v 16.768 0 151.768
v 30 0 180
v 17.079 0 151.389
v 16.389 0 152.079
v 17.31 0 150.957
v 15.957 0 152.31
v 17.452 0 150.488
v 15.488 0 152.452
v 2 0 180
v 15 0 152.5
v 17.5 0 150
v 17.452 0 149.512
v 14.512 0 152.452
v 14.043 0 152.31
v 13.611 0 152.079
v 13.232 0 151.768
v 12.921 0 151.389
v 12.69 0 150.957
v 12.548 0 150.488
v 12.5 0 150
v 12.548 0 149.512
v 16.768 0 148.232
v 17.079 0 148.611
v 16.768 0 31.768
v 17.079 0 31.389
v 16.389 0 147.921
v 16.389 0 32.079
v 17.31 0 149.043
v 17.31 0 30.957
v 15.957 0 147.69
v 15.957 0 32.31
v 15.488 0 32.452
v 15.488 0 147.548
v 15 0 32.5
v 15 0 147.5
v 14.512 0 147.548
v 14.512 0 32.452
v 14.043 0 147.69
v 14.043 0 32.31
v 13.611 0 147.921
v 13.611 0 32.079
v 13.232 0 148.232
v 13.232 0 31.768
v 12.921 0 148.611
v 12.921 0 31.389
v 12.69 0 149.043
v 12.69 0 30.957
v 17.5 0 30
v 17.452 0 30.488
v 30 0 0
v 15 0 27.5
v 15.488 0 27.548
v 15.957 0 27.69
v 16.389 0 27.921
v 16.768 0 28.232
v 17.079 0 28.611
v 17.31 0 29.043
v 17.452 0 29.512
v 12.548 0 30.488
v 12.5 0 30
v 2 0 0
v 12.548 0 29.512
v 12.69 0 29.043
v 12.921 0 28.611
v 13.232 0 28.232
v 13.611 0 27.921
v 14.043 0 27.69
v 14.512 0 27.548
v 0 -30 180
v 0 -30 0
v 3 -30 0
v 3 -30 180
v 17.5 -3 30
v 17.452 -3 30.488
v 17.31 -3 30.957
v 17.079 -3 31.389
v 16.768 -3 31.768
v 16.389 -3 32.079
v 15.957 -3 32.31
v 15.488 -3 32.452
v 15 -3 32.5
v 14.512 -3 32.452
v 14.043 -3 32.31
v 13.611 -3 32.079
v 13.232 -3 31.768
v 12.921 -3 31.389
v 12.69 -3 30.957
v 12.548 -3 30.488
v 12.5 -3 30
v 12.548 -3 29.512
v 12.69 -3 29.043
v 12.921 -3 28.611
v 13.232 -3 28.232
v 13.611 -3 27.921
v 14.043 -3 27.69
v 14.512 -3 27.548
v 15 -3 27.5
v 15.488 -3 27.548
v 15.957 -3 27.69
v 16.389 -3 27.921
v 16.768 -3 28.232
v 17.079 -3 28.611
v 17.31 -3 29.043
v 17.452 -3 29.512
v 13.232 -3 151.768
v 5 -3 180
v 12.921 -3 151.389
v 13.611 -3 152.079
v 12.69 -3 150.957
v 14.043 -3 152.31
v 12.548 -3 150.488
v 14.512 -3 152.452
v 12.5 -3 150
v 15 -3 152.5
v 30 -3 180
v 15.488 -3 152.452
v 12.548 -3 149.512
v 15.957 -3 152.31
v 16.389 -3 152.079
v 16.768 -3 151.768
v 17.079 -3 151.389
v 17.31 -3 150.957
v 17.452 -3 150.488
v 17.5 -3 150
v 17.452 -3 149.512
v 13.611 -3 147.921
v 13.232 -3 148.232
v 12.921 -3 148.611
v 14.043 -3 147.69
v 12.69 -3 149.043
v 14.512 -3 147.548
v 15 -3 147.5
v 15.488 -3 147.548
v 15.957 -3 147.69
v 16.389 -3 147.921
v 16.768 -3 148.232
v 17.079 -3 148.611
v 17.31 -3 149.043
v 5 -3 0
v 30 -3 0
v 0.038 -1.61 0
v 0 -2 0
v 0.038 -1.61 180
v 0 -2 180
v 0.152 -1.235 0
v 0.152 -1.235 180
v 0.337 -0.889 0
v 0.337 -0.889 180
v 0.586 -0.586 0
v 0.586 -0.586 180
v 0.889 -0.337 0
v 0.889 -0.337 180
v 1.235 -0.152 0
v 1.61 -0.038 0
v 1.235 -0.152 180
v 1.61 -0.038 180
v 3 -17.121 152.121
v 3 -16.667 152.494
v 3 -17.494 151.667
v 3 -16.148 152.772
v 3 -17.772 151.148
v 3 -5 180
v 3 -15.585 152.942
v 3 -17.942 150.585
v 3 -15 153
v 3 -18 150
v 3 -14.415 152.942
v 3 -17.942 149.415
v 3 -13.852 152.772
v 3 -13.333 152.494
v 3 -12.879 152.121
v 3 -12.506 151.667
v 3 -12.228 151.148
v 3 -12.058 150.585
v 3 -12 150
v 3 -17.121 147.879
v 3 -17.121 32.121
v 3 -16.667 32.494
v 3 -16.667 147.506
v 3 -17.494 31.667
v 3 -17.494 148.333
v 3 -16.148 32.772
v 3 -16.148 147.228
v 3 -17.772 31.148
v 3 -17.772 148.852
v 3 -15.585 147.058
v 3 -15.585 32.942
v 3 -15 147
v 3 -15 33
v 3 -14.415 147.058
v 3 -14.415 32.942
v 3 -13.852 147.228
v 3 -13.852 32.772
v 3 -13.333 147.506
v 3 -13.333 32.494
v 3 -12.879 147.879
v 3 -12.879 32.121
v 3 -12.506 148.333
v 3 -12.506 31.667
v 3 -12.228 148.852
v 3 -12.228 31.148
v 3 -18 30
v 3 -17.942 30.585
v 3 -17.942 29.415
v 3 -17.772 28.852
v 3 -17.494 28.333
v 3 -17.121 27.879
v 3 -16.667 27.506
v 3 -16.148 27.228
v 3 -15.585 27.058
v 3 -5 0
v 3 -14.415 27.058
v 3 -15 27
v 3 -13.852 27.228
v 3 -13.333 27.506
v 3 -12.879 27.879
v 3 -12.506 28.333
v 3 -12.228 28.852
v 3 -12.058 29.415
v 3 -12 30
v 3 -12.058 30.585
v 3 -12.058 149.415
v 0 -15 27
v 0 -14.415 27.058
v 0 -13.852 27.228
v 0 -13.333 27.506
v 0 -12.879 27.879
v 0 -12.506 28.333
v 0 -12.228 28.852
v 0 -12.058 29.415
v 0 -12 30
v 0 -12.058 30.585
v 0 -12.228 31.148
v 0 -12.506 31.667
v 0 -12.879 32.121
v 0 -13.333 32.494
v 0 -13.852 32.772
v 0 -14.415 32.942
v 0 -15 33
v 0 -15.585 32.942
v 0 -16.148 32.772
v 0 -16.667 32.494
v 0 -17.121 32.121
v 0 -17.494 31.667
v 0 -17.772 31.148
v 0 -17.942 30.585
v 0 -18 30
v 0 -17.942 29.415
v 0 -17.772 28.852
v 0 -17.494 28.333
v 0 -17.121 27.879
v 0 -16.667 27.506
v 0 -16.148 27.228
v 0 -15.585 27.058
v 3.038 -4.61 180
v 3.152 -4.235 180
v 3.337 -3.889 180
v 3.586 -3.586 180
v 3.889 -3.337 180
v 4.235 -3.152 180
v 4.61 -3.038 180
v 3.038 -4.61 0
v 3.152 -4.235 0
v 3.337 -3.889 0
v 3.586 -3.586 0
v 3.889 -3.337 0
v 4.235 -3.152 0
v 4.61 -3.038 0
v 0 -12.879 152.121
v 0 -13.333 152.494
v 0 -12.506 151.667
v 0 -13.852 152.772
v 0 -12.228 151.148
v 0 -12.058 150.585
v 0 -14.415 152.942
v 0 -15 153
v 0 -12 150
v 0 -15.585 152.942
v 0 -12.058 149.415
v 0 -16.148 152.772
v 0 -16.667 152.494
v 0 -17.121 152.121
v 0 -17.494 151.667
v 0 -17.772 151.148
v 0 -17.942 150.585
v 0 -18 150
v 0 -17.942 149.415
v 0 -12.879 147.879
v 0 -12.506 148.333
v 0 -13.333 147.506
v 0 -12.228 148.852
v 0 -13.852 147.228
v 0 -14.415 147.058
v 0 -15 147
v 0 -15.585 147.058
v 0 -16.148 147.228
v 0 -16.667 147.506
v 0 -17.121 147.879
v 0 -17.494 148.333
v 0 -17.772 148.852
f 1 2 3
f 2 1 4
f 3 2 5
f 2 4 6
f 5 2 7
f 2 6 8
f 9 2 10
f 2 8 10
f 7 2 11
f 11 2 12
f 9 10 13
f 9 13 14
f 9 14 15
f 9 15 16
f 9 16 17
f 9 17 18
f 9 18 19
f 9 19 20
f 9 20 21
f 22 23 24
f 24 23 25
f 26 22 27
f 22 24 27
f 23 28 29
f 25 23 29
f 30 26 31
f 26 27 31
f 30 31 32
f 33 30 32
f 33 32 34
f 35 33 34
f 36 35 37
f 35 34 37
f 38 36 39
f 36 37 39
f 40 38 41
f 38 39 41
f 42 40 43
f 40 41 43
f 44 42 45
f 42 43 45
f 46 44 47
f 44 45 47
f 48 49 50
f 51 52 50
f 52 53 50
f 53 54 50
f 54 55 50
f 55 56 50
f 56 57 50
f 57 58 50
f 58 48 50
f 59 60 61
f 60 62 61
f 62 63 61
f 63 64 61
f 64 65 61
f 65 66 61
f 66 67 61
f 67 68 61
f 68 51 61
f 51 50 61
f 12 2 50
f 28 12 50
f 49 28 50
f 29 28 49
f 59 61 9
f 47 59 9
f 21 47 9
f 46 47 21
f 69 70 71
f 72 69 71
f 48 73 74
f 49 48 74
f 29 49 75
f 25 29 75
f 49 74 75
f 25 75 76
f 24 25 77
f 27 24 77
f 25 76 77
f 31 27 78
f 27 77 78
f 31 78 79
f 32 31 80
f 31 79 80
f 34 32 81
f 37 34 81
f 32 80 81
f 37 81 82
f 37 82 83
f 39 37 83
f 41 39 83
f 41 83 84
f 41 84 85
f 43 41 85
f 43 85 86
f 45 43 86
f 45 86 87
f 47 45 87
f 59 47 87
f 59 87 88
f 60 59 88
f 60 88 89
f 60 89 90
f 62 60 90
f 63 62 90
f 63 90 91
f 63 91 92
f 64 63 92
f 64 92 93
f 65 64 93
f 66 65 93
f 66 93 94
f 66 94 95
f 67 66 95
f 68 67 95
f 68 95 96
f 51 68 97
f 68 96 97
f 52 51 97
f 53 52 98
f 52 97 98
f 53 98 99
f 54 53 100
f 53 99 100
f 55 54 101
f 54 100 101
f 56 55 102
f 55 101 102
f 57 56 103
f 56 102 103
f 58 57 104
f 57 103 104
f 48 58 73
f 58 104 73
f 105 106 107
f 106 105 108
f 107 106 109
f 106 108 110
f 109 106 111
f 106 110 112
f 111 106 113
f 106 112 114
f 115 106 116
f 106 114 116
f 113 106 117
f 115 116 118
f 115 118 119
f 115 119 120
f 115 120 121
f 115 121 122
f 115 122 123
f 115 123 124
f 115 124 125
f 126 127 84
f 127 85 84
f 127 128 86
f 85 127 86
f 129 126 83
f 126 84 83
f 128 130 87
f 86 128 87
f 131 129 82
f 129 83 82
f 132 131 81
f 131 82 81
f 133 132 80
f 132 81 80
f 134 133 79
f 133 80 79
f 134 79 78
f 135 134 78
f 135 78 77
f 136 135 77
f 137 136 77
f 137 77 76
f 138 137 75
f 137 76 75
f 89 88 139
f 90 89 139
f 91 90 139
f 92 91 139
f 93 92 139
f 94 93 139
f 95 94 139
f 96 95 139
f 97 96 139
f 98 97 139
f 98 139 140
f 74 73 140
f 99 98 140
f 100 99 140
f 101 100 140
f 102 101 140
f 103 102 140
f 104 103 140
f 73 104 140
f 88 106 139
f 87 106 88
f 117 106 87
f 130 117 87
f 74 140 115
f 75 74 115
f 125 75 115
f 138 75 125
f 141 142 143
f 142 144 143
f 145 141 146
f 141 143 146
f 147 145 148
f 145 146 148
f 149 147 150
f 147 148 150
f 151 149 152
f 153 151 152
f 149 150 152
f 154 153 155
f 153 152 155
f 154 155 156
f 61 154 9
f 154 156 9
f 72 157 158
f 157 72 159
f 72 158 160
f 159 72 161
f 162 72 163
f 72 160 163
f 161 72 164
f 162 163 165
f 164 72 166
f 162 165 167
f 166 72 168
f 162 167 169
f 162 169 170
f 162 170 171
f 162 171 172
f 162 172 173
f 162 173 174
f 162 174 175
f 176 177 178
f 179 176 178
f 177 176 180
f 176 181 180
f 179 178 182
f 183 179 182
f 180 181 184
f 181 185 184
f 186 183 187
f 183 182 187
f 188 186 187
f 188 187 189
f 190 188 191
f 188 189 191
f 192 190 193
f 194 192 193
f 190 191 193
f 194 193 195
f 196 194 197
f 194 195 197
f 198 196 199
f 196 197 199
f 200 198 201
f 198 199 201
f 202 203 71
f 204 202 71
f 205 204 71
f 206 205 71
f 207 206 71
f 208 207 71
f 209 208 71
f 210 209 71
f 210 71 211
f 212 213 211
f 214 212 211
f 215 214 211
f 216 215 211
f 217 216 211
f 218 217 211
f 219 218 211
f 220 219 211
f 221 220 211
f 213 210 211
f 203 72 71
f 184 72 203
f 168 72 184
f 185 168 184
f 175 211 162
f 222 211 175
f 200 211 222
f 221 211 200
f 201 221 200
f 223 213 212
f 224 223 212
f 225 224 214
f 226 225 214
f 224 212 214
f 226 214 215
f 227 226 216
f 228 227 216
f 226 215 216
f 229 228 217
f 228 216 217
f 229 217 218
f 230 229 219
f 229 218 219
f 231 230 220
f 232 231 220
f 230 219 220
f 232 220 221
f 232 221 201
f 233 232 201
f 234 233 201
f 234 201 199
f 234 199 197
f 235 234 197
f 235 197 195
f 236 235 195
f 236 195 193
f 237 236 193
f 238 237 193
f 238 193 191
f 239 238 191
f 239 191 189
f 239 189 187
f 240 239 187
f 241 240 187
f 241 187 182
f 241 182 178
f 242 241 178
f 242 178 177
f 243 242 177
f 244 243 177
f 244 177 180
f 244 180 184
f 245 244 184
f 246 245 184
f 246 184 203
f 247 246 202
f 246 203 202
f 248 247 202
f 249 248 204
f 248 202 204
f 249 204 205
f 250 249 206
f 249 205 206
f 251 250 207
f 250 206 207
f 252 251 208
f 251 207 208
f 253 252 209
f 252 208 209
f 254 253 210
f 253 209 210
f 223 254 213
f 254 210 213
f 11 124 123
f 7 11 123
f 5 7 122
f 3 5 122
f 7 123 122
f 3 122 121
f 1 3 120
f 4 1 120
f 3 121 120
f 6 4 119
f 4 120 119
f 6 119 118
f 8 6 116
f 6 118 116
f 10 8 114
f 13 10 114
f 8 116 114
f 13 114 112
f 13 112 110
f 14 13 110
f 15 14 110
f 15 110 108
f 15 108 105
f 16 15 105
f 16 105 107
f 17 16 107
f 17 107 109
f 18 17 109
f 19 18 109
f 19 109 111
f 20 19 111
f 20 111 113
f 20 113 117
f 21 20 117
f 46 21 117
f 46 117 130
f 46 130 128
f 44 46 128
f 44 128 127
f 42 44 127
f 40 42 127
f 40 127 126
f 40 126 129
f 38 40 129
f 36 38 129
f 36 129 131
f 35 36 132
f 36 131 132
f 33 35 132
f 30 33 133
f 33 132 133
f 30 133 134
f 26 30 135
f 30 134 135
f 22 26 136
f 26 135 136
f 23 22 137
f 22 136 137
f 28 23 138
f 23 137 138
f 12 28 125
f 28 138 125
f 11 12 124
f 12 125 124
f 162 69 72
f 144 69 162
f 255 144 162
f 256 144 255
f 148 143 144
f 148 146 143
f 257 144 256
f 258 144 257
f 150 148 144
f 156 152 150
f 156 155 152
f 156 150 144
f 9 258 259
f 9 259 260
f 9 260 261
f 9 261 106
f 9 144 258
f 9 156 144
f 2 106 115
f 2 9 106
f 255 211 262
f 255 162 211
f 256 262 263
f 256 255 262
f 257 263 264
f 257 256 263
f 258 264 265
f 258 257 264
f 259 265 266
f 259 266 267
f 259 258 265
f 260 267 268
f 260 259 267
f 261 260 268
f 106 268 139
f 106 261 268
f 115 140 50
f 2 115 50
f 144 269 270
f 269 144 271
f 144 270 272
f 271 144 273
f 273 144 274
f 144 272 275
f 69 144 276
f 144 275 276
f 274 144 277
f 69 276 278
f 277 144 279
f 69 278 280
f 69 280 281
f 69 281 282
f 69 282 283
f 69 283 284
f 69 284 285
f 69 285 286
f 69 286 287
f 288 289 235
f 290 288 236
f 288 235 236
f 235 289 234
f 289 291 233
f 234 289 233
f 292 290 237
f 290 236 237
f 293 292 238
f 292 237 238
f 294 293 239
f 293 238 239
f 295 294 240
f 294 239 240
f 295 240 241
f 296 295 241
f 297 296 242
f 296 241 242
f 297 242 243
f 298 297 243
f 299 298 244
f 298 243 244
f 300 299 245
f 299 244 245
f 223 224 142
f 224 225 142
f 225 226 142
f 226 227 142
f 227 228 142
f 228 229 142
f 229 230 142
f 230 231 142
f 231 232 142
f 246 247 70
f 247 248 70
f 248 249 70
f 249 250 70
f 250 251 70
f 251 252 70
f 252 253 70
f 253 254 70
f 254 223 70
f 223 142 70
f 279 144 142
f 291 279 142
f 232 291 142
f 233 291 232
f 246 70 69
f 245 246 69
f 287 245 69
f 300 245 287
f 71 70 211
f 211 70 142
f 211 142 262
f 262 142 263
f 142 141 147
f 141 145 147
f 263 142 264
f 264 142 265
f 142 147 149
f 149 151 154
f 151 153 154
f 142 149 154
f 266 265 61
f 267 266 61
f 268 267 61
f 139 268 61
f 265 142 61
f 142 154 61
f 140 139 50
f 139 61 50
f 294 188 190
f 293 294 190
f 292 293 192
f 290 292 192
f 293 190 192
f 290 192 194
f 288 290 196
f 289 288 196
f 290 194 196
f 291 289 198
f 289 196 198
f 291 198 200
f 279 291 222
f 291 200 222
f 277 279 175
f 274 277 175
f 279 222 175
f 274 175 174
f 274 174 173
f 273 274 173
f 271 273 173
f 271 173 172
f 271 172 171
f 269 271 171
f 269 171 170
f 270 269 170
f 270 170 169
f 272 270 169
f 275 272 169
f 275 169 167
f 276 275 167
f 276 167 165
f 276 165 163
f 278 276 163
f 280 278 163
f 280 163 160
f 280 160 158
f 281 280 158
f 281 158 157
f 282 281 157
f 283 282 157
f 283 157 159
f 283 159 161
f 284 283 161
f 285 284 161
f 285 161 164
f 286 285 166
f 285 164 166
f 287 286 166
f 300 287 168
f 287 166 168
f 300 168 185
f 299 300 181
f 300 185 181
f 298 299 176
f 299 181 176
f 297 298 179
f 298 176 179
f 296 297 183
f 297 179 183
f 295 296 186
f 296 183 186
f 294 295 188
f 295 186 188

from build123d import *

# Parameters (mm, degrees)
BOSS_EXTRU_1_DEPTH      = 180
ESQUISSE2_R             = 3
ENL_V_MAT_EXTRU_1_DEPTH = 180
ESQUISSE3_R             = 2.5
ENL_V_MAT_EXTRU_2_DEPTH = 180
CONG_1_R                = 2


with BuildPart() as part:
    # Esquisse1 → Boss.-Extru.1 (new body)
    with BuildSketch(Plane.XY):
        Polygon((0, 0), (0, -30), (3, -30), (3, -3), (30, -3), (30, 0), align=None)
    extrude(amount=BOSS_EXTRU_1_DEPTH)

    # Esquisse2 → Enlèv. mat.-Extru.1 (cut)
    with BuildSketch(Plane(origin=(3, 0, 0), x_dir=(0, 0, -1), z_dir=(1, 0, 0))):
        with Locations((-30, -15)):
            Circle(ESQUISSE2_R)
        with Locations((-150, -15)):
            Circle(ESQUISSE2_R)
    extrude(amount=-ENL_V_MAT_EXTRU_1_DEPTH, mode=Mode.SUBTRACT)

    # Esquisse3 → Enlèv. mat.-Extru.2 (cut)
    with BuildSketch(Plane.XZ.offset(3)):
        with Locations((15, 150)):
            Circle(ESQUISSE3_R)
        with Locations((15, 30)):
            Circle(ESQUISSE3_R)
    extrude(amount=-ENL_V_MAT_EXTRU_2_DEPTH, mode=Mode.SUBTRACT)

    # Congé1
    cong_1_edges = [part.edges().sort_by_distance(p)[0] for p in [
        (3, -3, 90),
        (0, 0, 90),
    ]]
    fillet(cong_1_edges, radius=CONG_1_R)


solid = part.part
